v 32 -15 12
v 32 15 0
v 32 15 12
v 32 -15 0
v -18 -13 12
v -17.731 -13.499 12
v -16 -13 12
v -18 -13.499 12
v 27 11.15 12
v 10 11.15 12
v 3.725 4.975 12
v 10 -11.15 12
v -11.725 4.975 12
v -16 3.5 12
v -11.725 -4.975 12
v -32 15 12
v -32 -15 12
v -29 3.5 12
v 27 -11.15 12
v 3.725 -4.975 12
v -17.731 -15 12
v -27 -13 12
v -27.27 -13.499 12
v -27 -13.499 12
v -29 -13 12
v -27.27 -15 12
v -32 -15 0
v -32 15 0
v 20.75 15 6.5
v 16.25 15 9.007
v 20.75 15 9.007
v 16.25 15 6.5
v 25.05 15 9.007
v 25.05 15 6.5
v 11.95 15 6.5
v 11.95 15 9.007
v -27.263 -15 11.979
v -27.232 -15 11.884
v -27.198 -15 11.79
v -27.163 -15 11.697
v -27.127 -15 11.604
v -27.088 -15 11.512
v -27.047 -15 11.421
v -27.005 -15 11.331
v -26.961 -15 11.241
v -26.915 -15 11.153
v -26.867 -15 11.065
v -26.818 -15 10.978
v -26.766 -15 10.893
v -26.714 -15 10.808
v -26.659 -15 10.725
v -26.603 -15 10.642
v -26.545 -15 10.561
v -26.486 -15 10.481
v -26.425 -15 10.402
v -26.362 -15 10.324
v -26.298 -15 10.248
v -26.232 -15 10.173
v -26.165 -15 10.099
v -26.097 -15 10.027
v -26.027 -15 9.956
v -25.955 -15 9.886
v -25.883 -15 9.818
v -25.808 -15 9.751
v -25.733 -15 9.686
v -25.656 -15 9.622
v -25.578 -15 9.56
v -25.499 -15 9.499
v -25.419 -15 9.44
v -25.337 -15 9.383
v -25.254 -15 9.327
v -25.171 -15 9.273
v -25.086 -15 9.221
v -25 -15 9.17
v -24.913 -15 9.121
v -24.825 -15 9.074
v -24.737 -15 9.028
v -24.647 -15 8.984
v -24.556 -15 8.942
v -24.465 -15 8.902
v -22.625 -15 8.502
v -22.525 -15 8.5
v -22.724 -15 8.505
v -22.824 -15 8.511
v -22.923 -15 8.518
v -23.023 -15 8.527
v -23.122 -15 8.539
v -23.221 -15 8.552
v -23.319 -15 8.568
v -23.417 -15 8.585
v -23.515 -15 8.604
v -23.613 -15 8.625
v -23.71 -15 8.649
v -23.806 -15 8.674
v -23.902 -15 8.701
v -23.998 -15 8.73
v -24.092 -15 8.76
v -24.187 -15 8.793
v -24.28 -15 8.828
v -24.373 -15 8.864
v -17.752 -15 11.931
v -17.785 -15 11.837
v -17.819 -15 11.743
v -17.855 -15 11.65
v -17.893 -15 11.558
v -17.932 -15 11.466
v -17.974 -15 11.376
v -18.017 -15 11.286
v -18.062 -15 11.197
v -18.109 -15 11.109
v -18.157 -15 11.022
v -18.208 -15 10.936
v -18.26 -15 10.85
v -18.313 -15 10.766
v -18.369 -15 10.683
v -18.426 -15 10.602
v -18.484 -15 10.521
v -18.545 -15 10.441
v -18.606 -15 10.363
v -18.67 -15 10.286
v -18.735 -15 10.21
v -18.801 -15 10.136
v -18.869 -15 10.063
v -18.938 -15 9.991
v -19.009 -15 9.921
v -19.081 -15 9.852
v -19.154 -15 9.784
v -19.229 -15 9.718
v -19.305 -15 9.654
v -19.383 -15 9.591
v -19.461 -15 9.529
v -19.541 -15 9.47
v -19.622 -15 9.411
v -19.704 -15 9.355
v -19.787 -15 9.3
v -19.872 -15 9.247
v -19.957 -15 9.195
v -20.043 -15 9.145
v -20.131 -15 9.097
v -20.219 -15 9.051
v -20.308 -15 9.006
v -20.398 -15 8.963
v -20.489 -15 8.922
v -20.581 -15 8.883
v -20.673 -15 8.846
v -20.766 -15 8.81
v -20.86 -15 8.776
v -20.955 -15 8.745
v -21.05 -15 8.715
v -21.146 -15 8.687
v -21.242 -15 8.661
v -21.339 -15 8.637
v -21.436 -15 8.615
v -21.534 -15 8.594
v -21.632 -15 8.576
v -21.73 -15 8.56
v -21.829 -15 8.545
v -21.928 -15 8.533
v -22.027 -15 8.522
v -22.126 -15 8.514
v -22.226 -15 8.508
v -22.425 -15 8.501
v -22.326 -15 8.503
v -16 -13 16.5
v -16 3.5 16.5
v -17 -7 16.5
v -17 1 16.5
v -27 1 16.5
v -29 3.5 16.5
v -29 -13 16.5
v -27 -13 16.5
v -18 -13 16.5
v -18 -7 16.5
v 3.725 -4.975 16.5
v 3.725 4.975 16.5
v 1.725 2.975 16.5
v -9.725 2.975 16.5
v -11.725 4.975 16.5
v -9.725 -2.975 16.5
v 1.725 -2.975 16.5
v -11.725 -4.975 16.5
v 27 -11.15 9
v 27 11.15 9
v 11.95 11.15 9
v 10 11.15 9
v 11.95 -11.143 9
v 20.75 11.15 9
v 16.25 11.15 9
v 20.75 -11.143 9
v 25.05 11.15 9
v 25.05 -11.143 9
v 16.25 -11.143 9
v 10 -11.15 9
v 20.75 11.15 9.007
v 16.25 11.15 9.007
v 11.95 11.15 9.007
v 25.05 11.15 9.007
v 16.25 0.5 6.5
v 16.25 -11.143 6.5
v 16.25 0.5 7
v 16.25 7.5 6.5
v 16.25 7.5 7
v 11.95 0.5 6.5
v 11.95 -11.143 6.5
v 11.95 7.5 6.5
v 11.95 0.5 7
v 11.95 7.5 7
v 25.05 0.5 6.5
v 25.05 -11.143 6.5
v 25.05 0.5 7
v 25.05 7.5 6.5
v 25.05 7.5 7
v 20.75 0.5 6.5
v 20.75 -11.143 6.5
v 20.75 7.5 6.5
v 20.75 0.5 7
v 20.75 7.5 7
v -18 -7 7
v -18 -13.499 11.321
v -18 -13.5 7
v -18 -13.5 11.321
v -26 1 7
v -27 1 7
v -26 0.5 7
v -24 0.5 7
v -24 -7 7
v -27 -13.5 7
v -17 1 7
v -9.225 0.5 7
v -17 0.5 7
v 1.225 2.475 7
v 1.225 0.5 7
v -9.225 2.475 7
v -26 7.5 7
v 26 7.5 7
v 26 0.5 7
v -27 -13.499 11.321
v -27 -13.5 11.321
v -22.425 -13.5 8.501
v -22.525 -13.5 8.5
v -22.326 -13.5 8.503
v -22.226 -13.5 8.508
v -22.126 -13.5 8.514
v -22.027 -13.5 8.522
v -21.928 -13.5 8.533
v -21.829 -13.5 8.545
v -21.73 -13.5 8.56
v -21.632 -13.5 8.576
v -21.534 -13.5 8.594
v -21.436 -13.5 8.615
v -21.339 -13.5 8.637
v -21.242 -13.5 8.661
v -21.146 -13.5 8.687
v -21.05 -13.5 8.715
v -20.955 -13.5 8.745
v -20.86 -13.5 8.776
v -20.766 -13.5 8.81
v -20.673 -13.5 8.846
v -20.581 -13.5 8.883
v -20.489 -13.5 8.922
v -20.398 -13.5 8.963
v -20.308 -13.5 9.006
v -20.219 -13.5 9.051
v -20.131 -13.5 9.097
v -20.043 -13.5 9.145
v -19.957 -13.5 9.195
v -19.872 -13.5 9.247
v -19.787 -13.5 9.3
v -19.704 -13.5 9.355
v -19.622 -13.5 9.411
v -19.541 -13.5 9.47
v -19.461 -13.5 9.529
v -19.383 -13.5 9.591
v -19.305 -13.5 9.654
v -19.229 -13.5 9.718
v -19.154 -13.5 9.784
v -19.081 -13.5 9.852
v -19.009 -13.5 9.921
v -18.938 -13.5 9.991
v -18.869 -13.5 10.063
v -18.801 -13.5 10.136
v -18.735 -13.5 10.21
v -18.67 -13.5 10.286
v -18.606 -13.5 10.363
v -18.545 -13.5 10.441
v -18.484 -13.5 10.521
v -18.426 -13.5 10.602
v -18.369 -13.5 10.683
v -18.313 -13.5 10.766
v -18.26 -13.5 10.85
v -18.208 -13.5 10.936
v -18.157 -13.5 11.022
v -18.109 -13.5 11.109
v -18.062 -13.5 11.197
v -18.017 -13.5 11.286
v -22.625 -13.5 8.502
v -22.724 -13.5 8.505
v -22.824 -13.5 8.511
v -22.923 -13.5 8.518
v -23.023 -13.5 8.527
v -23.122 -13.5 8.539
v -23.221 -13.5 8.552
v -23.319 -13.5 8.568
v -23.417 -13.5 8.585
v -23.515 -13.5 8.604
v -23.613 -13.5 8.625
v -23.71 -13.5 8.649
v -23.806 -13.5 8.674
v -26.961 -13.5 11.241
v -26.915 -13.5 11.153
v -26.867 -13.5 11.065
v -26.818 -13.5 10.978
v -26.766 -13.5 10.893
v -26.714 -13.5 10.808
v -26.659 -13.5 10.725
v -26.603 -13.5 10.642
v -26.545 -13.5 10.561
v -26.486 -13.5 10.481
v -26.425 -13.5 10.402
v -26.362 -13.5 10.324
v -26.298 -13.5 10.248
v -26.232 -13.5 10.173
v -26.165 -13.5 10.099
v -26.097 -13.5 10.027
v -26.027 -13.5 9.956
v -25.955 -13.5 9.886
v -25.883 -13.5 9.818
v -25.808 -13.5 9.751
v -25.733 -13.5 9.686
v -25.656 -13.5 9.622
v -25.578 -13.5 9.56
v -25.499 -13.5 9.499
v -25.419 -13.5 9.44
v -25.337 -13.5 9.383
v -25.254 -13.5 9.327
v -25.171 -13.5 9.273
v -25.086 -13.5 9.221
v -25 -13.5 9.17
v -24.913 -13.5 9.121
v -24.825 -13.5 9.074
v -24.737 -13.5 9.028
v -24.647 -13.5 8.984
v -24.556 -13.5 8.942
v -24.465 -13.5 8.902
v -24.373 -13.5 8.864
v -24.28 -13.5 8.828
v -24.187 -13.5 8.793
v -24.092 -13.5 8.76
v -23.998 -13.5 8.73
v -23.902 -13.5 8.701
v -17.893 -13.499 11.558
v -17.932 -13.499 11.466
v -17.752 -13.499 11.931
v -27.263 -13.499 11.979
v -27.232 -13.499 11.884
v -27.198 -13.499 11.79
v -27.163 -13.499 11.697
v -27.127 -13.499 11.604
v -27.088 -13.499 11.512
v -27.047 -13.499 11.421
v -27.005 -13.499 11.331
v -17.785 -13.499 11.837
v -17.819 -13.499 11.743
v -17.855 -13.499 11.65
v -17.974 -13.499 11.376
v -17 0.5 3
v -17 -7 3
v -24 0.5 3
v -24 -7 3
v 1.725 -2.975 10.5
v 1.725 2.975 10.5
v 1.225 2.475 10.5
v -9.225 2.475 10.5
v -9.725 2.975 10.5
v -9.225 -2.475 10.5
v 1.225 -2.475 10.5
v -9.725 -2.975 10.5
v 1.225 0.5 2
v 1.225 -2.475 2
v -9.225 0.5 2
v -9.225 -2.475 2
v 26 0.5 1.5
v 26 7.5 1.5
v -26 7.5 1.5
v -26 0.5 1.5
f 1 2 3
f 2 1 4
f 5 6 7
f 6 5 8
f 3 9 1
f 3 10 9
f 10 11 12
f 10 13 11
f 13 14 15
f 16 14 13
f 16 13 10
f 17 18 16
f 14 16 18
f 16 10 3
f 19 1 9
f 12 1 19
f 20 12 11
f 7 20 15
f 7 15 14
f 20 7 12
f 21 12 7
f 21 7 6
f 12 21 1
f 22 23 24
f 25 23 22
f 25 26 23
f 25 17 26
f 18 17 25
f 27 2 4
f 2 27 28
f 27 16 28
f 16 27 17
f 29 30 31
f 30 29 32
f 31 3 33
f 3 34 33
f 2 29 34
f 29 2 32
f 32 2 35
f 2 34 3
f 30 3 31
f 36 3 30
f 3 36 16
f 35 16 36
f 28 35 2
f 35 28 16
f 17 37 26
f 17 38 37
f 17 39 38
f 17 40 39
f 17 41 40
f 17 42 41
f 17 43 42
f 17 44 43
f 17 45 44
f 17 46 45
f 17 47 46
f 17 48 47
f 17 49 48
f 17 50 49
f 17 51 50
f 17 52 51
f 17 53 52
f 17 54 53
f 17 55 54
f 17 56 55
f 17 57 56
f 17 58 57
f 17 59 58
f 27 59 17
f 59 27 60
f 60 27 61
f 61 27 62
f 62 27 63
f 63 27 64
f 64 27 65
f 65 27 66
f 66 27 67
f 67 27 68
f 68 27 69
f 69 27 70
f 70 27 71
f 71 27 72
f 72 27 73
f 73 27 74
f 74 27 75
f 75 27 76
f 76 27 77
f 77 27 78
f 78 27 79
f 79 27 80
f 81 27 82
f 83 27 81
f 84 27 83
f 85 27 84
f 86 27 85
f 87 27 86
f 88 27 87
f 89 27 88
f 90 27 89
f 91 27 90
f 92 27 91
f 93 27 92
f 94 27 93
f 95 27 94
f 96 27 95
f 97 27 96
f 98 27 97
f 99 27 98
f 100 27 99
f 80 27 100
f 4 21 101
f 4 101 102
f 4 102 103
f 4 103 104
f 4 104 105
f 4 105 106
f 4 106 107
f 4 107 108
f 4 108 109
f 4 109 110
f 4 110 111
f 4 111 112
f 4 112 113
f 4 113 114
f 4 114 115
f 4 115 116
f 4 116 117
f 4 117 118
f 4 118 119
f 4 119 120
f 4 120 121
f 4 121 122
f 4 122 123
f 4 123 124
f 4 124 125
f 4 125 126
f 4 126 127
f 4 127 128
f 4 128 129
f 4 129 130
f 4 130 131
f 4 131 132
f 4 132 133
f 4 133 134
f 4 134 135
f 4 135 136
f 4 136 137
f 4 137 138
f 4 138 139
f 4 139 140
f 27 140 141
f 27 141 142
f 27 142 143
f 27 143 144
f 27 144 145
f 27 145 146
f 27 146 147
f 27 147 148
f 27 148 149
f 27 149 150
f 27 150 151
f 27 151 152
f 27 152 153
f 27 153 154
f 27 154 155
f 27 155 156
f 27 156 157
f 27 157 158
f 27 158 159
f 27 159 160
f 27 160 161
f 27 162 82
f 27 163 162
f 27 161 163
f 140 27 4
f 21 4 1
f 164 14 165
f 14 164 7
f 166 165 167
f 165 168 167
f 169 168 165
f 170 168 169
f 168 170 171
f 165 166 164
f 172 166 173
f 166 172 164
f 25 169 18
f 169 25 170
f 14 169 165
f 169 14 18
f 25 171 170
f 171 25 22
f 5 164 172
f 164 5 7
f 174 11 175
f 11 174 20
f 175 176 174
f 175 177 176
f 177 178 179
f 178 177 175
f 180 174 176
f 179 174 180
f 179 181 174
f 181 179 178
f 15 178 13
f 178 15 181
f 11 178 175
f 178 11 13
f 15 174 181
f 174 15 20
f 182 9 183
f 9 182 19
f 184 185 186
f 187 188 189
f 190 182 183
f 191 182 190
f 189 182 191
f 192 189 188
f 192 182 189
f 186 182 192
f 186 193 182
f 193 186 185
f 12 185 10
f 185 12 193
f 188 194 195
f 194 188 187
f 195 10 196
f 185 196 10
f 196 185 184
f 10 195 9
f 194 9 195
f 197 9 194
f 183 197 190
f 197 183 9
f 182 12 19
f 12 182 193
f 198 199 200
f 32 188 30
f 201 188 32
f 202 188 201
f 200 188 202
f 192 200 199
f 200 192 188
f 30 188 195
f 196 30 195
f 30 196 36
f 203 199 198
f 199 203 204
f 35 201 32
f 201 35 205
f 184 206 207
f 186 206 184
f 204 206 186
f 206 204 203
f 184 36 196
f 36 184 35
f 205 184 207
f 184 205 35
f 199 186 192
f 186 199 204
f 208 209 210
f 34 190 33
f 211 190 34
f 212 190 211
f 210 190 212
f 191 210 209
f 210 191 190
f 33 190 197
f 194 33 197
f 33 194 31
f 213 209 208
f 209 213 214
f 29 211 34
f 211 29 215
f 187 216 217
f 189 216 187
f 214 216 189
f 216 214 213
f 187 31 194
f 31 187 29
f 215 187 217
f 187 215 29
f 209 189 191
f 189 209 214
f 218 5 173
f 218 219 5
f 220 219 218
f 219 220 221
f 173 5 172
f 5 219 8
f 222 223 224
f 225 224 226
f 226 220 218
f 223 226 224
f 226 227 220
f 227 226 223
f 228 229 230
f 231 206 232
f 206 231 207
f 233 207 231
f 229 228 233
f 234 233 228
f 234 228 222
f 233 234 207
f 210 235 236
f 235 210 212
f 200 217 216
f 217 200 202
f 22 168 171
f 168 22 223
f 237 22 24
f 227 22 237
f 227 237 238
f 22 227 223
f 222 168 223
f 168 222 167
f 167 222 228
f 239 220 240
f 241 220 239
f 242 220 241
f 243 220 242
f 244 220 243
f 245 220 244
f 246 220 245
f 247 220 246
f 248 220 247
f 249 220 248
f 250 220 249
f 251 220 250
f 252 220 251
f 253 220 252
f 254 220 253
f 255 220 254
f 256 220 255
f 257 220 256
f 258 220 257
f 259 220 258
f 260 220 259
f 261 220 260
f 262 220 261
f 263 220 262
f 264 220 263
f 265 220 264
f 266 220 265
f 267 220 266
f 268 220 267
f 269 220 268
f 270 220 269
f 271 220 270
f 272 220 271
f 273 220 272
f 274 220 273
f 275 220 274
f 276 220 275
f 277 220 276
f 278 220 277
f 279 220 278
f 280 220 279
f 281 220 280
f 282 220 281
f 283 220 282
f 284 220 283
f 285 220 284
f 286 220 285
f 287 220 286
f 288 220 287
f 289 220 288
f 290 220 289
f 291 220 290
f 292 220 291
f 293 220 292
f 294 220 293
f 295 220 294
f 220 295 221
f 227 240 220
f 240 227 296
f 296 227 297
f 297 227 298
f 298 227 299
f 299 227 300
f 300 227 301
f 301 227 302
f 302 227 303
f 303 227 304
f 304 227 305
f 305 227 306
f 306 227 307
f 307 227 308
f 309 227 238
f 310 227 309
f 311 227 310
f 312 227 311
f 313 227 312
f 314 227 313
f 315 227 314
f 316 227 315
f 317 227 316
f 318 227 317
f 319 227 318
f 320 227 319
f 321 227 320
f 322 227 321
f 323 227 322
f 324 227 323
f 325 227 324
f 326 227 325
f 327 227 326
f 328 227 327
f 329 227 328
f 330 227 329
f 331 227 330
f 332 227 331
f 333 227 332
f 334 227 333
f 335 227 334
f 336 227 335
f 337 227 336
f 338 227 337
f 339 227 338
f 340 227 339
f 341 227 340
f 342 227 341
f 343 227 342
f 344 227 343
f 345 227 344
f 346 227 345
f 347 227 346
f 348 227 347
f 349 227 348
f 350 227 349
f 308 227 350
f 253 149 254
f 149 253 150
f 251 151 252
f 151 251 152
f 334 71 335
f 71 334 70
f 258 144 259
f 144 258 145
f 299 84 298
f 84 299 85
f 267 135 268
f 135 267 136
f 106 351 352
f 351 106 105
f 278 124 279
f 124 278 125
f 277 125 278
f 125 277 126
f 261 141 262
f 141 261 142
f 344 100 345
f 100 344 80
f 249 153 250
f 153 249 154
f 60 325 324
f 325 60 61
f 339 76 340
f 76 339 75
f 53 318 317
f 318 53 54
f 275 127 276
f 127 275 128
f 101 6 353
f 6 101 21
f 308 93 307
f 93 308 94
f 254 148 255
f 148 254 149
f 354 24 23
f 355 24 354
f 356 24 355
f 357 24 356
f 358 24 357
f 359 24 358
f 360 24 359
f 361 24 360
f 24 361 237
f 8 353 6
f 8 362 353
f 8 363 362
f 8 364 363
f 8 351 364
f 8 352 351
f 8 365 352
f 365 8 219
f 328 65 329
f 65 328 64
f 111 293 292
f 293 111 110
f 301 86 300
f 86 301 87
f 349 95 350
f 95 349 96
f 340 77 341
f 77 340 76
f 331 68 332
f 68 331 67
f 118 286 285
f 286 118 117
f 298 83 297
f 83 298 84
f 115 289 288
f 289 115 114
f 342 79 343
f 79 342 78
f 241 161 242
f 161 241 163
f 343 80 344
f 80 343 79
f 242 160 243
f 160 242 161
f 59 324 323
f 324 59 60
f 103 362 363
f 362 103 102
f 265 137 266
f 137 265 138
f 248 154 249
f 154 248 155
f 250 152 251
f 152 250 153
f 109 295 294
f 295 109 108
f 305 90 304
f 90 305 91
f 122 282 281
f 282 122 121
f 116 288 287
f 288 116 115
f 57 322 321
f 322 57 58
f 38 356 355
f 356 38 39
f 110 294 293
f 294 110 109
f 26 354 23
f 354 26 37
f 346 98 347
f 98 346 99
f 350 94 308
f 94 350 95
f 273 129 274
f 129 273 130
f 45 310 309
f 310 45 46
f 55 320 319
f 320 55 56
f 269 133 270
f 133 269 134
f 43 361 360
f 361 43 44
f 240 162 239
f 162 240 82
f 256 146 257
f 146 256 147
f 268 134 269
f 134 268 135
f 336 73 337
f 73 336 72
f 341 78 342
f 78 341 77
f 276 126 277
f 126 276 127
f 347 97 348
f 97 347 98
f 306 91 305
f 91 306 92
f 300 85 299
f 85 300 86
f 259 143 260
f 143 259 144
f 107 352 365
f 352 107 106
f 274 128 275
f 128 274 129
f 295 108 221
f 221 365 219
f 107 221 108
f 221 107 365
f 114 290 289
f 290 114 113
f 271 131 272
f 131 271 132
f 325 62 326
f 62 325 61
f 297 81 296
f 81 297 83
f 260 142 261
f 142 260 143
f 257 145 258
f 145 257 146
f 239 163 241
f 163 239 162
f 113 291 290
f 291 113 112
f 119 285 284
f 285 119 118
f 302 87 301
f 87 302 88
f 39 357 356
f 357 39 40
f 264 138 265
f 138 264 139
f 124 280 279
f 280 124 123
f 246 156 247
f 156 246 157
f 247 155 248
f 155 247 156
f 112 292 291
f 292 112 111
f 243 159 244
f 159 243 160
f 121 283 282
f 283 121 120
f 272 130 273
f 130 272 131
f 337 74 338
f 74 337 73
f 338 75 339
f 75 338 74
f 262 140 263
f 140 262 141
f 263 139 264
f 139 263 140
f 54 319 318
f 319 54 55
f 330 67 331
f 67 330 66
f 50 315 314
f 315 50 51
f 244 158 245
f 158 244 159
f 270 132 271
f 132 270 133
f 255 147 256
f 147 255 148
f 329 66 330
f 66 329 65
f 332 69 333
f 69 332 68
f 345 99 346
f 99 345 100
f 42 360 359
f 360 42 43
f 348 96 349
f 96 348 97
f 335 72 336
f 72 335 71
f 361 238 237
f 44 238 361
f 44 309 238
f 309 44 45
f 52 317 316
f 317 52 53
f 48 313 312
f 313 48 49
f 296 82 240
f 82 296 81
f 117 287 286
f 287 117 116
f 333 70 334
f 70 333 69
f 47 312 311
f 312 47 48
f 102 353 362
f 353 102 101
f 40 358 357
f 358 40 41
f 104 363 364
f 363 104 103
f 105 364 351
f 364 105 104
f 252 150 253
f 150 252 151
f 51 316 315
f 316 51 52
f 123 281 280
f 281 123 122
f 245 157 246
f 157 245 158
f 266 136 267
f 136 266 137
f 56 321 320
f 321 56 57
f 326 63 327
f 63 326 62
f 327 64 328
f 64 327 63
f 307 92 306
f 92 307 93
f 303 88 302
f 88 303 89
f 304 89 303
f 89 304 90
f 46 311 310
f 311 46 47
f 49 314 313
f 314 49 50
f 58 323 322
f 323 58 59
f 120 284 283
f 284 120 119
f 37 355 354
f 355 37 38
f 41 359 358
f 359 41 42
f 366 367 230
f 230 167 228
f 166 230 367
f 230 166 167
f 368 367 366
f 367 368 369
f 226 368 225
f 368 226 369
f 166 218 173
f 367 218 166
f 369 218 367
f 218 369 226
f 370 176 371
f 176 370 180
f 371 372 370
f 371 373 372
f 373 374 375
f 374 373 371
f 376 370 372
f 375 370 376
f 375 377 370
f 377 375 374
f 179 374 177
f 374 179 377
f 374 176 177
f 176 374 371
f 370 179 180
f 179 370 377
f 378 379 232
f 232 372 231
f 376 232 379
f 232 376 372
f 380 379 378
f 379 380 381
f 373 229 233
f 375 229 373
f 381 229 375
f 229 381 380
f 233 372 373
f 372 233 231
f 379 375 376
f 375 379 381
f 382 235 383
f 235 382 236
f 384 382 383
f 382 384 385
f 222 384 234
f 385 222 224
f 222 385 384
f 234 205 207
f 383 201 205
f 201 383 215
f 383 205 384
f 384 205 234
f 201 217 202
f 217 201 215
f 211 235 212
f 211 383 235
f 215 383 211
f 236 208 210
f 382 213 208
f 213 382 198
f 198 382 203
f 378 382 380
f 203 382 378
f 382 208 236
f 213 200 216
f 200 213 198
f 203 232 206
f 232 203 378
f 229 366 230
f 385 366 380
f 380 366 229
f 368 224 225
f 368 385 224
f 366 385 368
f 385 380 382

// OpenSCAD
// Fine subdivisions, for production run
$fa = 1; $fs = 0.1;
// Coarse, but faster, subdivisions, for testing.
//$fa = 2; $fs = 0.3;

base_l = 64;
base_w = 30;
base_h = 12;
dc_dc_l = 22.3;
dc_dc_w = 17;
jack_w = 9;
jack_l = 14.5;
jack_edge_dist = 1.5;
switch_l = 11.45;
switch_w = 5.95;
switch_h = 12.5;
channel_bottom = 1.5;
channel_top = 5;
channel_h = base_h-channel_bottom-channel_top;
channel_w = 7;
channel_l = base_l - 2*6;
channel_y = -.5*base_w+jack_edge_dist+jack_l-0.5;

module power_jack_cutout(positive) {
  cutout_h = 5;
  cutout2_h = cutout_h-1.5;
  cutout2_dia = 10;
  cutout3_h = cutout_h+4;
  cutout3_l = 8;
  cutout3_w1 = 6;
  cutout3_w2 = 1;
  extra = 20;
  wall_thick = 2;
  wall_height = 4.5;
  eps=0.0013251;

  translate([-.5*base_l+jack_w+5-.5*jack_w, 0, 0]) {
    if (positive) {
      translate([0,
                 -.5*base_w+jack_edge_dist+.5*(jack_l+wall_thick)+0.5,
                 base_h-eps+.5*(wall_height+eps)])
        cube([jack_w+2*wall_thick, jack_l+wall_thick, wall_height+eps], center=true);
    } else {
      translate([0, -.5*base_w+.5*jack_l+jack_edge_dist, base_h-cutout_h+.5*(cutout_h+extra)])
        cube([jack_w, jack_l, cutout_h+extra], center=true);
      translate([0, -.5*base_w-eps, base_h+.5*cutout2_dia-cutout2_h])
        rotate([-90, 0, 0])
        cylinder(d=cutout2_dia, h=jack_edge_dist+2*eps, center=false);
      translate([.5*jack_w+cutout3_w2-.5*(cutout3_w1+cutout3_w2),
                  -.5*base_w+jack_edge_dist+jack_l-.5*cutout3_l,
                  base_h-cutout3_h+.5*(cutout3_h+extra)])
        cube([cutout3_w1+cutout3_w2, cutout3_l, cutout3_h+extra], center=true);
    }
  }
}


module switch_cutout(positive) {
  cutout = switch_h + 2;
  sw_edge = 0.5;
  sw_h2 = 6;
  eps = 0.00231;
  wall_thick = 2;
  wall_height = 4.5;

  translate([-.5*(dc_dc_w-jack_w), 0, base_h]) {
    if (positive) {
      translate([0, 0, -eps+.5*(wall_height+eps)])
        cube([switch_l+2*wall_thick, switch_w+2*wall_thick, wall_height+eps], center=true);
    } else {
      translate([0, 0, wall_height-sw_h2+.5*(sw_h2+eps)])
        cube([switch_l, switch_w, sw_h2+eps], center=true);
      translate([0, 0, wall_height-cutout+.5*(cutout+2*eps)])
        cube([switch_l-2*sw_edge, switch_w-2*sw_edge, cutout+2*eps], center=true);
    }
  }
}


module dc_dc_cutout() {
  cutout_h = 3;
  extra = 15;
  ch_w = 4.3;
  ch_depth = 2.5;
  ch_offset = 4.1;
  eps = 0.0073;

  translate([.5*base_l-dc_dc_w-5+.5*dc_dc_w, 0, base_h-cutout_h]) {
    translate([0, 0, .5*(cutout_h+extra)])
      cube([dc_dc_w, dc_dc_l, cutout_h+extra], center=true);
    translate([-.5*dc_dc_w+ch_offset, -.5*dc_dc_l+eps+.5*base_w, -ch_depth+.5*(ch_depth+eps)])
      cube([ch_w, base_w, ch_depth+eps], center=true);
    translate([+.5*dc_dc_w-ch_offset, -.5*dc_dc_l+eps+.5*base_w, -ch_depth+.5*(ch_depth+eps)])
      cube([ch_w, base_w, ch_depth+eps], center=true);
  }
}


module wire_channel() {
  translate([0, channel_y+.5*channel_w, channel_bottom+.5*channel_h])
    cube([channel_l, channel_w, channel_h], center=true);
}

module base() {
  translate([0, 0, .5*base_h])
    cube([base_l, base_w, base_h], center=true);
  power_jack_cutout(positive=true);
  switch_cutout(positive=true);
}


module tmp_power_base() {
  difference() {
    base();
    dc_dc_cutout();
    power_jack_cutout(positive=false);
    switch_cutout(positive=false);
    wire_channel();
  }
}

intersection() {
  tmp_power_base();
  // Test prints.
  //translate([-32, 0, 0]) cube([20, 50, 50], center=true);
}
